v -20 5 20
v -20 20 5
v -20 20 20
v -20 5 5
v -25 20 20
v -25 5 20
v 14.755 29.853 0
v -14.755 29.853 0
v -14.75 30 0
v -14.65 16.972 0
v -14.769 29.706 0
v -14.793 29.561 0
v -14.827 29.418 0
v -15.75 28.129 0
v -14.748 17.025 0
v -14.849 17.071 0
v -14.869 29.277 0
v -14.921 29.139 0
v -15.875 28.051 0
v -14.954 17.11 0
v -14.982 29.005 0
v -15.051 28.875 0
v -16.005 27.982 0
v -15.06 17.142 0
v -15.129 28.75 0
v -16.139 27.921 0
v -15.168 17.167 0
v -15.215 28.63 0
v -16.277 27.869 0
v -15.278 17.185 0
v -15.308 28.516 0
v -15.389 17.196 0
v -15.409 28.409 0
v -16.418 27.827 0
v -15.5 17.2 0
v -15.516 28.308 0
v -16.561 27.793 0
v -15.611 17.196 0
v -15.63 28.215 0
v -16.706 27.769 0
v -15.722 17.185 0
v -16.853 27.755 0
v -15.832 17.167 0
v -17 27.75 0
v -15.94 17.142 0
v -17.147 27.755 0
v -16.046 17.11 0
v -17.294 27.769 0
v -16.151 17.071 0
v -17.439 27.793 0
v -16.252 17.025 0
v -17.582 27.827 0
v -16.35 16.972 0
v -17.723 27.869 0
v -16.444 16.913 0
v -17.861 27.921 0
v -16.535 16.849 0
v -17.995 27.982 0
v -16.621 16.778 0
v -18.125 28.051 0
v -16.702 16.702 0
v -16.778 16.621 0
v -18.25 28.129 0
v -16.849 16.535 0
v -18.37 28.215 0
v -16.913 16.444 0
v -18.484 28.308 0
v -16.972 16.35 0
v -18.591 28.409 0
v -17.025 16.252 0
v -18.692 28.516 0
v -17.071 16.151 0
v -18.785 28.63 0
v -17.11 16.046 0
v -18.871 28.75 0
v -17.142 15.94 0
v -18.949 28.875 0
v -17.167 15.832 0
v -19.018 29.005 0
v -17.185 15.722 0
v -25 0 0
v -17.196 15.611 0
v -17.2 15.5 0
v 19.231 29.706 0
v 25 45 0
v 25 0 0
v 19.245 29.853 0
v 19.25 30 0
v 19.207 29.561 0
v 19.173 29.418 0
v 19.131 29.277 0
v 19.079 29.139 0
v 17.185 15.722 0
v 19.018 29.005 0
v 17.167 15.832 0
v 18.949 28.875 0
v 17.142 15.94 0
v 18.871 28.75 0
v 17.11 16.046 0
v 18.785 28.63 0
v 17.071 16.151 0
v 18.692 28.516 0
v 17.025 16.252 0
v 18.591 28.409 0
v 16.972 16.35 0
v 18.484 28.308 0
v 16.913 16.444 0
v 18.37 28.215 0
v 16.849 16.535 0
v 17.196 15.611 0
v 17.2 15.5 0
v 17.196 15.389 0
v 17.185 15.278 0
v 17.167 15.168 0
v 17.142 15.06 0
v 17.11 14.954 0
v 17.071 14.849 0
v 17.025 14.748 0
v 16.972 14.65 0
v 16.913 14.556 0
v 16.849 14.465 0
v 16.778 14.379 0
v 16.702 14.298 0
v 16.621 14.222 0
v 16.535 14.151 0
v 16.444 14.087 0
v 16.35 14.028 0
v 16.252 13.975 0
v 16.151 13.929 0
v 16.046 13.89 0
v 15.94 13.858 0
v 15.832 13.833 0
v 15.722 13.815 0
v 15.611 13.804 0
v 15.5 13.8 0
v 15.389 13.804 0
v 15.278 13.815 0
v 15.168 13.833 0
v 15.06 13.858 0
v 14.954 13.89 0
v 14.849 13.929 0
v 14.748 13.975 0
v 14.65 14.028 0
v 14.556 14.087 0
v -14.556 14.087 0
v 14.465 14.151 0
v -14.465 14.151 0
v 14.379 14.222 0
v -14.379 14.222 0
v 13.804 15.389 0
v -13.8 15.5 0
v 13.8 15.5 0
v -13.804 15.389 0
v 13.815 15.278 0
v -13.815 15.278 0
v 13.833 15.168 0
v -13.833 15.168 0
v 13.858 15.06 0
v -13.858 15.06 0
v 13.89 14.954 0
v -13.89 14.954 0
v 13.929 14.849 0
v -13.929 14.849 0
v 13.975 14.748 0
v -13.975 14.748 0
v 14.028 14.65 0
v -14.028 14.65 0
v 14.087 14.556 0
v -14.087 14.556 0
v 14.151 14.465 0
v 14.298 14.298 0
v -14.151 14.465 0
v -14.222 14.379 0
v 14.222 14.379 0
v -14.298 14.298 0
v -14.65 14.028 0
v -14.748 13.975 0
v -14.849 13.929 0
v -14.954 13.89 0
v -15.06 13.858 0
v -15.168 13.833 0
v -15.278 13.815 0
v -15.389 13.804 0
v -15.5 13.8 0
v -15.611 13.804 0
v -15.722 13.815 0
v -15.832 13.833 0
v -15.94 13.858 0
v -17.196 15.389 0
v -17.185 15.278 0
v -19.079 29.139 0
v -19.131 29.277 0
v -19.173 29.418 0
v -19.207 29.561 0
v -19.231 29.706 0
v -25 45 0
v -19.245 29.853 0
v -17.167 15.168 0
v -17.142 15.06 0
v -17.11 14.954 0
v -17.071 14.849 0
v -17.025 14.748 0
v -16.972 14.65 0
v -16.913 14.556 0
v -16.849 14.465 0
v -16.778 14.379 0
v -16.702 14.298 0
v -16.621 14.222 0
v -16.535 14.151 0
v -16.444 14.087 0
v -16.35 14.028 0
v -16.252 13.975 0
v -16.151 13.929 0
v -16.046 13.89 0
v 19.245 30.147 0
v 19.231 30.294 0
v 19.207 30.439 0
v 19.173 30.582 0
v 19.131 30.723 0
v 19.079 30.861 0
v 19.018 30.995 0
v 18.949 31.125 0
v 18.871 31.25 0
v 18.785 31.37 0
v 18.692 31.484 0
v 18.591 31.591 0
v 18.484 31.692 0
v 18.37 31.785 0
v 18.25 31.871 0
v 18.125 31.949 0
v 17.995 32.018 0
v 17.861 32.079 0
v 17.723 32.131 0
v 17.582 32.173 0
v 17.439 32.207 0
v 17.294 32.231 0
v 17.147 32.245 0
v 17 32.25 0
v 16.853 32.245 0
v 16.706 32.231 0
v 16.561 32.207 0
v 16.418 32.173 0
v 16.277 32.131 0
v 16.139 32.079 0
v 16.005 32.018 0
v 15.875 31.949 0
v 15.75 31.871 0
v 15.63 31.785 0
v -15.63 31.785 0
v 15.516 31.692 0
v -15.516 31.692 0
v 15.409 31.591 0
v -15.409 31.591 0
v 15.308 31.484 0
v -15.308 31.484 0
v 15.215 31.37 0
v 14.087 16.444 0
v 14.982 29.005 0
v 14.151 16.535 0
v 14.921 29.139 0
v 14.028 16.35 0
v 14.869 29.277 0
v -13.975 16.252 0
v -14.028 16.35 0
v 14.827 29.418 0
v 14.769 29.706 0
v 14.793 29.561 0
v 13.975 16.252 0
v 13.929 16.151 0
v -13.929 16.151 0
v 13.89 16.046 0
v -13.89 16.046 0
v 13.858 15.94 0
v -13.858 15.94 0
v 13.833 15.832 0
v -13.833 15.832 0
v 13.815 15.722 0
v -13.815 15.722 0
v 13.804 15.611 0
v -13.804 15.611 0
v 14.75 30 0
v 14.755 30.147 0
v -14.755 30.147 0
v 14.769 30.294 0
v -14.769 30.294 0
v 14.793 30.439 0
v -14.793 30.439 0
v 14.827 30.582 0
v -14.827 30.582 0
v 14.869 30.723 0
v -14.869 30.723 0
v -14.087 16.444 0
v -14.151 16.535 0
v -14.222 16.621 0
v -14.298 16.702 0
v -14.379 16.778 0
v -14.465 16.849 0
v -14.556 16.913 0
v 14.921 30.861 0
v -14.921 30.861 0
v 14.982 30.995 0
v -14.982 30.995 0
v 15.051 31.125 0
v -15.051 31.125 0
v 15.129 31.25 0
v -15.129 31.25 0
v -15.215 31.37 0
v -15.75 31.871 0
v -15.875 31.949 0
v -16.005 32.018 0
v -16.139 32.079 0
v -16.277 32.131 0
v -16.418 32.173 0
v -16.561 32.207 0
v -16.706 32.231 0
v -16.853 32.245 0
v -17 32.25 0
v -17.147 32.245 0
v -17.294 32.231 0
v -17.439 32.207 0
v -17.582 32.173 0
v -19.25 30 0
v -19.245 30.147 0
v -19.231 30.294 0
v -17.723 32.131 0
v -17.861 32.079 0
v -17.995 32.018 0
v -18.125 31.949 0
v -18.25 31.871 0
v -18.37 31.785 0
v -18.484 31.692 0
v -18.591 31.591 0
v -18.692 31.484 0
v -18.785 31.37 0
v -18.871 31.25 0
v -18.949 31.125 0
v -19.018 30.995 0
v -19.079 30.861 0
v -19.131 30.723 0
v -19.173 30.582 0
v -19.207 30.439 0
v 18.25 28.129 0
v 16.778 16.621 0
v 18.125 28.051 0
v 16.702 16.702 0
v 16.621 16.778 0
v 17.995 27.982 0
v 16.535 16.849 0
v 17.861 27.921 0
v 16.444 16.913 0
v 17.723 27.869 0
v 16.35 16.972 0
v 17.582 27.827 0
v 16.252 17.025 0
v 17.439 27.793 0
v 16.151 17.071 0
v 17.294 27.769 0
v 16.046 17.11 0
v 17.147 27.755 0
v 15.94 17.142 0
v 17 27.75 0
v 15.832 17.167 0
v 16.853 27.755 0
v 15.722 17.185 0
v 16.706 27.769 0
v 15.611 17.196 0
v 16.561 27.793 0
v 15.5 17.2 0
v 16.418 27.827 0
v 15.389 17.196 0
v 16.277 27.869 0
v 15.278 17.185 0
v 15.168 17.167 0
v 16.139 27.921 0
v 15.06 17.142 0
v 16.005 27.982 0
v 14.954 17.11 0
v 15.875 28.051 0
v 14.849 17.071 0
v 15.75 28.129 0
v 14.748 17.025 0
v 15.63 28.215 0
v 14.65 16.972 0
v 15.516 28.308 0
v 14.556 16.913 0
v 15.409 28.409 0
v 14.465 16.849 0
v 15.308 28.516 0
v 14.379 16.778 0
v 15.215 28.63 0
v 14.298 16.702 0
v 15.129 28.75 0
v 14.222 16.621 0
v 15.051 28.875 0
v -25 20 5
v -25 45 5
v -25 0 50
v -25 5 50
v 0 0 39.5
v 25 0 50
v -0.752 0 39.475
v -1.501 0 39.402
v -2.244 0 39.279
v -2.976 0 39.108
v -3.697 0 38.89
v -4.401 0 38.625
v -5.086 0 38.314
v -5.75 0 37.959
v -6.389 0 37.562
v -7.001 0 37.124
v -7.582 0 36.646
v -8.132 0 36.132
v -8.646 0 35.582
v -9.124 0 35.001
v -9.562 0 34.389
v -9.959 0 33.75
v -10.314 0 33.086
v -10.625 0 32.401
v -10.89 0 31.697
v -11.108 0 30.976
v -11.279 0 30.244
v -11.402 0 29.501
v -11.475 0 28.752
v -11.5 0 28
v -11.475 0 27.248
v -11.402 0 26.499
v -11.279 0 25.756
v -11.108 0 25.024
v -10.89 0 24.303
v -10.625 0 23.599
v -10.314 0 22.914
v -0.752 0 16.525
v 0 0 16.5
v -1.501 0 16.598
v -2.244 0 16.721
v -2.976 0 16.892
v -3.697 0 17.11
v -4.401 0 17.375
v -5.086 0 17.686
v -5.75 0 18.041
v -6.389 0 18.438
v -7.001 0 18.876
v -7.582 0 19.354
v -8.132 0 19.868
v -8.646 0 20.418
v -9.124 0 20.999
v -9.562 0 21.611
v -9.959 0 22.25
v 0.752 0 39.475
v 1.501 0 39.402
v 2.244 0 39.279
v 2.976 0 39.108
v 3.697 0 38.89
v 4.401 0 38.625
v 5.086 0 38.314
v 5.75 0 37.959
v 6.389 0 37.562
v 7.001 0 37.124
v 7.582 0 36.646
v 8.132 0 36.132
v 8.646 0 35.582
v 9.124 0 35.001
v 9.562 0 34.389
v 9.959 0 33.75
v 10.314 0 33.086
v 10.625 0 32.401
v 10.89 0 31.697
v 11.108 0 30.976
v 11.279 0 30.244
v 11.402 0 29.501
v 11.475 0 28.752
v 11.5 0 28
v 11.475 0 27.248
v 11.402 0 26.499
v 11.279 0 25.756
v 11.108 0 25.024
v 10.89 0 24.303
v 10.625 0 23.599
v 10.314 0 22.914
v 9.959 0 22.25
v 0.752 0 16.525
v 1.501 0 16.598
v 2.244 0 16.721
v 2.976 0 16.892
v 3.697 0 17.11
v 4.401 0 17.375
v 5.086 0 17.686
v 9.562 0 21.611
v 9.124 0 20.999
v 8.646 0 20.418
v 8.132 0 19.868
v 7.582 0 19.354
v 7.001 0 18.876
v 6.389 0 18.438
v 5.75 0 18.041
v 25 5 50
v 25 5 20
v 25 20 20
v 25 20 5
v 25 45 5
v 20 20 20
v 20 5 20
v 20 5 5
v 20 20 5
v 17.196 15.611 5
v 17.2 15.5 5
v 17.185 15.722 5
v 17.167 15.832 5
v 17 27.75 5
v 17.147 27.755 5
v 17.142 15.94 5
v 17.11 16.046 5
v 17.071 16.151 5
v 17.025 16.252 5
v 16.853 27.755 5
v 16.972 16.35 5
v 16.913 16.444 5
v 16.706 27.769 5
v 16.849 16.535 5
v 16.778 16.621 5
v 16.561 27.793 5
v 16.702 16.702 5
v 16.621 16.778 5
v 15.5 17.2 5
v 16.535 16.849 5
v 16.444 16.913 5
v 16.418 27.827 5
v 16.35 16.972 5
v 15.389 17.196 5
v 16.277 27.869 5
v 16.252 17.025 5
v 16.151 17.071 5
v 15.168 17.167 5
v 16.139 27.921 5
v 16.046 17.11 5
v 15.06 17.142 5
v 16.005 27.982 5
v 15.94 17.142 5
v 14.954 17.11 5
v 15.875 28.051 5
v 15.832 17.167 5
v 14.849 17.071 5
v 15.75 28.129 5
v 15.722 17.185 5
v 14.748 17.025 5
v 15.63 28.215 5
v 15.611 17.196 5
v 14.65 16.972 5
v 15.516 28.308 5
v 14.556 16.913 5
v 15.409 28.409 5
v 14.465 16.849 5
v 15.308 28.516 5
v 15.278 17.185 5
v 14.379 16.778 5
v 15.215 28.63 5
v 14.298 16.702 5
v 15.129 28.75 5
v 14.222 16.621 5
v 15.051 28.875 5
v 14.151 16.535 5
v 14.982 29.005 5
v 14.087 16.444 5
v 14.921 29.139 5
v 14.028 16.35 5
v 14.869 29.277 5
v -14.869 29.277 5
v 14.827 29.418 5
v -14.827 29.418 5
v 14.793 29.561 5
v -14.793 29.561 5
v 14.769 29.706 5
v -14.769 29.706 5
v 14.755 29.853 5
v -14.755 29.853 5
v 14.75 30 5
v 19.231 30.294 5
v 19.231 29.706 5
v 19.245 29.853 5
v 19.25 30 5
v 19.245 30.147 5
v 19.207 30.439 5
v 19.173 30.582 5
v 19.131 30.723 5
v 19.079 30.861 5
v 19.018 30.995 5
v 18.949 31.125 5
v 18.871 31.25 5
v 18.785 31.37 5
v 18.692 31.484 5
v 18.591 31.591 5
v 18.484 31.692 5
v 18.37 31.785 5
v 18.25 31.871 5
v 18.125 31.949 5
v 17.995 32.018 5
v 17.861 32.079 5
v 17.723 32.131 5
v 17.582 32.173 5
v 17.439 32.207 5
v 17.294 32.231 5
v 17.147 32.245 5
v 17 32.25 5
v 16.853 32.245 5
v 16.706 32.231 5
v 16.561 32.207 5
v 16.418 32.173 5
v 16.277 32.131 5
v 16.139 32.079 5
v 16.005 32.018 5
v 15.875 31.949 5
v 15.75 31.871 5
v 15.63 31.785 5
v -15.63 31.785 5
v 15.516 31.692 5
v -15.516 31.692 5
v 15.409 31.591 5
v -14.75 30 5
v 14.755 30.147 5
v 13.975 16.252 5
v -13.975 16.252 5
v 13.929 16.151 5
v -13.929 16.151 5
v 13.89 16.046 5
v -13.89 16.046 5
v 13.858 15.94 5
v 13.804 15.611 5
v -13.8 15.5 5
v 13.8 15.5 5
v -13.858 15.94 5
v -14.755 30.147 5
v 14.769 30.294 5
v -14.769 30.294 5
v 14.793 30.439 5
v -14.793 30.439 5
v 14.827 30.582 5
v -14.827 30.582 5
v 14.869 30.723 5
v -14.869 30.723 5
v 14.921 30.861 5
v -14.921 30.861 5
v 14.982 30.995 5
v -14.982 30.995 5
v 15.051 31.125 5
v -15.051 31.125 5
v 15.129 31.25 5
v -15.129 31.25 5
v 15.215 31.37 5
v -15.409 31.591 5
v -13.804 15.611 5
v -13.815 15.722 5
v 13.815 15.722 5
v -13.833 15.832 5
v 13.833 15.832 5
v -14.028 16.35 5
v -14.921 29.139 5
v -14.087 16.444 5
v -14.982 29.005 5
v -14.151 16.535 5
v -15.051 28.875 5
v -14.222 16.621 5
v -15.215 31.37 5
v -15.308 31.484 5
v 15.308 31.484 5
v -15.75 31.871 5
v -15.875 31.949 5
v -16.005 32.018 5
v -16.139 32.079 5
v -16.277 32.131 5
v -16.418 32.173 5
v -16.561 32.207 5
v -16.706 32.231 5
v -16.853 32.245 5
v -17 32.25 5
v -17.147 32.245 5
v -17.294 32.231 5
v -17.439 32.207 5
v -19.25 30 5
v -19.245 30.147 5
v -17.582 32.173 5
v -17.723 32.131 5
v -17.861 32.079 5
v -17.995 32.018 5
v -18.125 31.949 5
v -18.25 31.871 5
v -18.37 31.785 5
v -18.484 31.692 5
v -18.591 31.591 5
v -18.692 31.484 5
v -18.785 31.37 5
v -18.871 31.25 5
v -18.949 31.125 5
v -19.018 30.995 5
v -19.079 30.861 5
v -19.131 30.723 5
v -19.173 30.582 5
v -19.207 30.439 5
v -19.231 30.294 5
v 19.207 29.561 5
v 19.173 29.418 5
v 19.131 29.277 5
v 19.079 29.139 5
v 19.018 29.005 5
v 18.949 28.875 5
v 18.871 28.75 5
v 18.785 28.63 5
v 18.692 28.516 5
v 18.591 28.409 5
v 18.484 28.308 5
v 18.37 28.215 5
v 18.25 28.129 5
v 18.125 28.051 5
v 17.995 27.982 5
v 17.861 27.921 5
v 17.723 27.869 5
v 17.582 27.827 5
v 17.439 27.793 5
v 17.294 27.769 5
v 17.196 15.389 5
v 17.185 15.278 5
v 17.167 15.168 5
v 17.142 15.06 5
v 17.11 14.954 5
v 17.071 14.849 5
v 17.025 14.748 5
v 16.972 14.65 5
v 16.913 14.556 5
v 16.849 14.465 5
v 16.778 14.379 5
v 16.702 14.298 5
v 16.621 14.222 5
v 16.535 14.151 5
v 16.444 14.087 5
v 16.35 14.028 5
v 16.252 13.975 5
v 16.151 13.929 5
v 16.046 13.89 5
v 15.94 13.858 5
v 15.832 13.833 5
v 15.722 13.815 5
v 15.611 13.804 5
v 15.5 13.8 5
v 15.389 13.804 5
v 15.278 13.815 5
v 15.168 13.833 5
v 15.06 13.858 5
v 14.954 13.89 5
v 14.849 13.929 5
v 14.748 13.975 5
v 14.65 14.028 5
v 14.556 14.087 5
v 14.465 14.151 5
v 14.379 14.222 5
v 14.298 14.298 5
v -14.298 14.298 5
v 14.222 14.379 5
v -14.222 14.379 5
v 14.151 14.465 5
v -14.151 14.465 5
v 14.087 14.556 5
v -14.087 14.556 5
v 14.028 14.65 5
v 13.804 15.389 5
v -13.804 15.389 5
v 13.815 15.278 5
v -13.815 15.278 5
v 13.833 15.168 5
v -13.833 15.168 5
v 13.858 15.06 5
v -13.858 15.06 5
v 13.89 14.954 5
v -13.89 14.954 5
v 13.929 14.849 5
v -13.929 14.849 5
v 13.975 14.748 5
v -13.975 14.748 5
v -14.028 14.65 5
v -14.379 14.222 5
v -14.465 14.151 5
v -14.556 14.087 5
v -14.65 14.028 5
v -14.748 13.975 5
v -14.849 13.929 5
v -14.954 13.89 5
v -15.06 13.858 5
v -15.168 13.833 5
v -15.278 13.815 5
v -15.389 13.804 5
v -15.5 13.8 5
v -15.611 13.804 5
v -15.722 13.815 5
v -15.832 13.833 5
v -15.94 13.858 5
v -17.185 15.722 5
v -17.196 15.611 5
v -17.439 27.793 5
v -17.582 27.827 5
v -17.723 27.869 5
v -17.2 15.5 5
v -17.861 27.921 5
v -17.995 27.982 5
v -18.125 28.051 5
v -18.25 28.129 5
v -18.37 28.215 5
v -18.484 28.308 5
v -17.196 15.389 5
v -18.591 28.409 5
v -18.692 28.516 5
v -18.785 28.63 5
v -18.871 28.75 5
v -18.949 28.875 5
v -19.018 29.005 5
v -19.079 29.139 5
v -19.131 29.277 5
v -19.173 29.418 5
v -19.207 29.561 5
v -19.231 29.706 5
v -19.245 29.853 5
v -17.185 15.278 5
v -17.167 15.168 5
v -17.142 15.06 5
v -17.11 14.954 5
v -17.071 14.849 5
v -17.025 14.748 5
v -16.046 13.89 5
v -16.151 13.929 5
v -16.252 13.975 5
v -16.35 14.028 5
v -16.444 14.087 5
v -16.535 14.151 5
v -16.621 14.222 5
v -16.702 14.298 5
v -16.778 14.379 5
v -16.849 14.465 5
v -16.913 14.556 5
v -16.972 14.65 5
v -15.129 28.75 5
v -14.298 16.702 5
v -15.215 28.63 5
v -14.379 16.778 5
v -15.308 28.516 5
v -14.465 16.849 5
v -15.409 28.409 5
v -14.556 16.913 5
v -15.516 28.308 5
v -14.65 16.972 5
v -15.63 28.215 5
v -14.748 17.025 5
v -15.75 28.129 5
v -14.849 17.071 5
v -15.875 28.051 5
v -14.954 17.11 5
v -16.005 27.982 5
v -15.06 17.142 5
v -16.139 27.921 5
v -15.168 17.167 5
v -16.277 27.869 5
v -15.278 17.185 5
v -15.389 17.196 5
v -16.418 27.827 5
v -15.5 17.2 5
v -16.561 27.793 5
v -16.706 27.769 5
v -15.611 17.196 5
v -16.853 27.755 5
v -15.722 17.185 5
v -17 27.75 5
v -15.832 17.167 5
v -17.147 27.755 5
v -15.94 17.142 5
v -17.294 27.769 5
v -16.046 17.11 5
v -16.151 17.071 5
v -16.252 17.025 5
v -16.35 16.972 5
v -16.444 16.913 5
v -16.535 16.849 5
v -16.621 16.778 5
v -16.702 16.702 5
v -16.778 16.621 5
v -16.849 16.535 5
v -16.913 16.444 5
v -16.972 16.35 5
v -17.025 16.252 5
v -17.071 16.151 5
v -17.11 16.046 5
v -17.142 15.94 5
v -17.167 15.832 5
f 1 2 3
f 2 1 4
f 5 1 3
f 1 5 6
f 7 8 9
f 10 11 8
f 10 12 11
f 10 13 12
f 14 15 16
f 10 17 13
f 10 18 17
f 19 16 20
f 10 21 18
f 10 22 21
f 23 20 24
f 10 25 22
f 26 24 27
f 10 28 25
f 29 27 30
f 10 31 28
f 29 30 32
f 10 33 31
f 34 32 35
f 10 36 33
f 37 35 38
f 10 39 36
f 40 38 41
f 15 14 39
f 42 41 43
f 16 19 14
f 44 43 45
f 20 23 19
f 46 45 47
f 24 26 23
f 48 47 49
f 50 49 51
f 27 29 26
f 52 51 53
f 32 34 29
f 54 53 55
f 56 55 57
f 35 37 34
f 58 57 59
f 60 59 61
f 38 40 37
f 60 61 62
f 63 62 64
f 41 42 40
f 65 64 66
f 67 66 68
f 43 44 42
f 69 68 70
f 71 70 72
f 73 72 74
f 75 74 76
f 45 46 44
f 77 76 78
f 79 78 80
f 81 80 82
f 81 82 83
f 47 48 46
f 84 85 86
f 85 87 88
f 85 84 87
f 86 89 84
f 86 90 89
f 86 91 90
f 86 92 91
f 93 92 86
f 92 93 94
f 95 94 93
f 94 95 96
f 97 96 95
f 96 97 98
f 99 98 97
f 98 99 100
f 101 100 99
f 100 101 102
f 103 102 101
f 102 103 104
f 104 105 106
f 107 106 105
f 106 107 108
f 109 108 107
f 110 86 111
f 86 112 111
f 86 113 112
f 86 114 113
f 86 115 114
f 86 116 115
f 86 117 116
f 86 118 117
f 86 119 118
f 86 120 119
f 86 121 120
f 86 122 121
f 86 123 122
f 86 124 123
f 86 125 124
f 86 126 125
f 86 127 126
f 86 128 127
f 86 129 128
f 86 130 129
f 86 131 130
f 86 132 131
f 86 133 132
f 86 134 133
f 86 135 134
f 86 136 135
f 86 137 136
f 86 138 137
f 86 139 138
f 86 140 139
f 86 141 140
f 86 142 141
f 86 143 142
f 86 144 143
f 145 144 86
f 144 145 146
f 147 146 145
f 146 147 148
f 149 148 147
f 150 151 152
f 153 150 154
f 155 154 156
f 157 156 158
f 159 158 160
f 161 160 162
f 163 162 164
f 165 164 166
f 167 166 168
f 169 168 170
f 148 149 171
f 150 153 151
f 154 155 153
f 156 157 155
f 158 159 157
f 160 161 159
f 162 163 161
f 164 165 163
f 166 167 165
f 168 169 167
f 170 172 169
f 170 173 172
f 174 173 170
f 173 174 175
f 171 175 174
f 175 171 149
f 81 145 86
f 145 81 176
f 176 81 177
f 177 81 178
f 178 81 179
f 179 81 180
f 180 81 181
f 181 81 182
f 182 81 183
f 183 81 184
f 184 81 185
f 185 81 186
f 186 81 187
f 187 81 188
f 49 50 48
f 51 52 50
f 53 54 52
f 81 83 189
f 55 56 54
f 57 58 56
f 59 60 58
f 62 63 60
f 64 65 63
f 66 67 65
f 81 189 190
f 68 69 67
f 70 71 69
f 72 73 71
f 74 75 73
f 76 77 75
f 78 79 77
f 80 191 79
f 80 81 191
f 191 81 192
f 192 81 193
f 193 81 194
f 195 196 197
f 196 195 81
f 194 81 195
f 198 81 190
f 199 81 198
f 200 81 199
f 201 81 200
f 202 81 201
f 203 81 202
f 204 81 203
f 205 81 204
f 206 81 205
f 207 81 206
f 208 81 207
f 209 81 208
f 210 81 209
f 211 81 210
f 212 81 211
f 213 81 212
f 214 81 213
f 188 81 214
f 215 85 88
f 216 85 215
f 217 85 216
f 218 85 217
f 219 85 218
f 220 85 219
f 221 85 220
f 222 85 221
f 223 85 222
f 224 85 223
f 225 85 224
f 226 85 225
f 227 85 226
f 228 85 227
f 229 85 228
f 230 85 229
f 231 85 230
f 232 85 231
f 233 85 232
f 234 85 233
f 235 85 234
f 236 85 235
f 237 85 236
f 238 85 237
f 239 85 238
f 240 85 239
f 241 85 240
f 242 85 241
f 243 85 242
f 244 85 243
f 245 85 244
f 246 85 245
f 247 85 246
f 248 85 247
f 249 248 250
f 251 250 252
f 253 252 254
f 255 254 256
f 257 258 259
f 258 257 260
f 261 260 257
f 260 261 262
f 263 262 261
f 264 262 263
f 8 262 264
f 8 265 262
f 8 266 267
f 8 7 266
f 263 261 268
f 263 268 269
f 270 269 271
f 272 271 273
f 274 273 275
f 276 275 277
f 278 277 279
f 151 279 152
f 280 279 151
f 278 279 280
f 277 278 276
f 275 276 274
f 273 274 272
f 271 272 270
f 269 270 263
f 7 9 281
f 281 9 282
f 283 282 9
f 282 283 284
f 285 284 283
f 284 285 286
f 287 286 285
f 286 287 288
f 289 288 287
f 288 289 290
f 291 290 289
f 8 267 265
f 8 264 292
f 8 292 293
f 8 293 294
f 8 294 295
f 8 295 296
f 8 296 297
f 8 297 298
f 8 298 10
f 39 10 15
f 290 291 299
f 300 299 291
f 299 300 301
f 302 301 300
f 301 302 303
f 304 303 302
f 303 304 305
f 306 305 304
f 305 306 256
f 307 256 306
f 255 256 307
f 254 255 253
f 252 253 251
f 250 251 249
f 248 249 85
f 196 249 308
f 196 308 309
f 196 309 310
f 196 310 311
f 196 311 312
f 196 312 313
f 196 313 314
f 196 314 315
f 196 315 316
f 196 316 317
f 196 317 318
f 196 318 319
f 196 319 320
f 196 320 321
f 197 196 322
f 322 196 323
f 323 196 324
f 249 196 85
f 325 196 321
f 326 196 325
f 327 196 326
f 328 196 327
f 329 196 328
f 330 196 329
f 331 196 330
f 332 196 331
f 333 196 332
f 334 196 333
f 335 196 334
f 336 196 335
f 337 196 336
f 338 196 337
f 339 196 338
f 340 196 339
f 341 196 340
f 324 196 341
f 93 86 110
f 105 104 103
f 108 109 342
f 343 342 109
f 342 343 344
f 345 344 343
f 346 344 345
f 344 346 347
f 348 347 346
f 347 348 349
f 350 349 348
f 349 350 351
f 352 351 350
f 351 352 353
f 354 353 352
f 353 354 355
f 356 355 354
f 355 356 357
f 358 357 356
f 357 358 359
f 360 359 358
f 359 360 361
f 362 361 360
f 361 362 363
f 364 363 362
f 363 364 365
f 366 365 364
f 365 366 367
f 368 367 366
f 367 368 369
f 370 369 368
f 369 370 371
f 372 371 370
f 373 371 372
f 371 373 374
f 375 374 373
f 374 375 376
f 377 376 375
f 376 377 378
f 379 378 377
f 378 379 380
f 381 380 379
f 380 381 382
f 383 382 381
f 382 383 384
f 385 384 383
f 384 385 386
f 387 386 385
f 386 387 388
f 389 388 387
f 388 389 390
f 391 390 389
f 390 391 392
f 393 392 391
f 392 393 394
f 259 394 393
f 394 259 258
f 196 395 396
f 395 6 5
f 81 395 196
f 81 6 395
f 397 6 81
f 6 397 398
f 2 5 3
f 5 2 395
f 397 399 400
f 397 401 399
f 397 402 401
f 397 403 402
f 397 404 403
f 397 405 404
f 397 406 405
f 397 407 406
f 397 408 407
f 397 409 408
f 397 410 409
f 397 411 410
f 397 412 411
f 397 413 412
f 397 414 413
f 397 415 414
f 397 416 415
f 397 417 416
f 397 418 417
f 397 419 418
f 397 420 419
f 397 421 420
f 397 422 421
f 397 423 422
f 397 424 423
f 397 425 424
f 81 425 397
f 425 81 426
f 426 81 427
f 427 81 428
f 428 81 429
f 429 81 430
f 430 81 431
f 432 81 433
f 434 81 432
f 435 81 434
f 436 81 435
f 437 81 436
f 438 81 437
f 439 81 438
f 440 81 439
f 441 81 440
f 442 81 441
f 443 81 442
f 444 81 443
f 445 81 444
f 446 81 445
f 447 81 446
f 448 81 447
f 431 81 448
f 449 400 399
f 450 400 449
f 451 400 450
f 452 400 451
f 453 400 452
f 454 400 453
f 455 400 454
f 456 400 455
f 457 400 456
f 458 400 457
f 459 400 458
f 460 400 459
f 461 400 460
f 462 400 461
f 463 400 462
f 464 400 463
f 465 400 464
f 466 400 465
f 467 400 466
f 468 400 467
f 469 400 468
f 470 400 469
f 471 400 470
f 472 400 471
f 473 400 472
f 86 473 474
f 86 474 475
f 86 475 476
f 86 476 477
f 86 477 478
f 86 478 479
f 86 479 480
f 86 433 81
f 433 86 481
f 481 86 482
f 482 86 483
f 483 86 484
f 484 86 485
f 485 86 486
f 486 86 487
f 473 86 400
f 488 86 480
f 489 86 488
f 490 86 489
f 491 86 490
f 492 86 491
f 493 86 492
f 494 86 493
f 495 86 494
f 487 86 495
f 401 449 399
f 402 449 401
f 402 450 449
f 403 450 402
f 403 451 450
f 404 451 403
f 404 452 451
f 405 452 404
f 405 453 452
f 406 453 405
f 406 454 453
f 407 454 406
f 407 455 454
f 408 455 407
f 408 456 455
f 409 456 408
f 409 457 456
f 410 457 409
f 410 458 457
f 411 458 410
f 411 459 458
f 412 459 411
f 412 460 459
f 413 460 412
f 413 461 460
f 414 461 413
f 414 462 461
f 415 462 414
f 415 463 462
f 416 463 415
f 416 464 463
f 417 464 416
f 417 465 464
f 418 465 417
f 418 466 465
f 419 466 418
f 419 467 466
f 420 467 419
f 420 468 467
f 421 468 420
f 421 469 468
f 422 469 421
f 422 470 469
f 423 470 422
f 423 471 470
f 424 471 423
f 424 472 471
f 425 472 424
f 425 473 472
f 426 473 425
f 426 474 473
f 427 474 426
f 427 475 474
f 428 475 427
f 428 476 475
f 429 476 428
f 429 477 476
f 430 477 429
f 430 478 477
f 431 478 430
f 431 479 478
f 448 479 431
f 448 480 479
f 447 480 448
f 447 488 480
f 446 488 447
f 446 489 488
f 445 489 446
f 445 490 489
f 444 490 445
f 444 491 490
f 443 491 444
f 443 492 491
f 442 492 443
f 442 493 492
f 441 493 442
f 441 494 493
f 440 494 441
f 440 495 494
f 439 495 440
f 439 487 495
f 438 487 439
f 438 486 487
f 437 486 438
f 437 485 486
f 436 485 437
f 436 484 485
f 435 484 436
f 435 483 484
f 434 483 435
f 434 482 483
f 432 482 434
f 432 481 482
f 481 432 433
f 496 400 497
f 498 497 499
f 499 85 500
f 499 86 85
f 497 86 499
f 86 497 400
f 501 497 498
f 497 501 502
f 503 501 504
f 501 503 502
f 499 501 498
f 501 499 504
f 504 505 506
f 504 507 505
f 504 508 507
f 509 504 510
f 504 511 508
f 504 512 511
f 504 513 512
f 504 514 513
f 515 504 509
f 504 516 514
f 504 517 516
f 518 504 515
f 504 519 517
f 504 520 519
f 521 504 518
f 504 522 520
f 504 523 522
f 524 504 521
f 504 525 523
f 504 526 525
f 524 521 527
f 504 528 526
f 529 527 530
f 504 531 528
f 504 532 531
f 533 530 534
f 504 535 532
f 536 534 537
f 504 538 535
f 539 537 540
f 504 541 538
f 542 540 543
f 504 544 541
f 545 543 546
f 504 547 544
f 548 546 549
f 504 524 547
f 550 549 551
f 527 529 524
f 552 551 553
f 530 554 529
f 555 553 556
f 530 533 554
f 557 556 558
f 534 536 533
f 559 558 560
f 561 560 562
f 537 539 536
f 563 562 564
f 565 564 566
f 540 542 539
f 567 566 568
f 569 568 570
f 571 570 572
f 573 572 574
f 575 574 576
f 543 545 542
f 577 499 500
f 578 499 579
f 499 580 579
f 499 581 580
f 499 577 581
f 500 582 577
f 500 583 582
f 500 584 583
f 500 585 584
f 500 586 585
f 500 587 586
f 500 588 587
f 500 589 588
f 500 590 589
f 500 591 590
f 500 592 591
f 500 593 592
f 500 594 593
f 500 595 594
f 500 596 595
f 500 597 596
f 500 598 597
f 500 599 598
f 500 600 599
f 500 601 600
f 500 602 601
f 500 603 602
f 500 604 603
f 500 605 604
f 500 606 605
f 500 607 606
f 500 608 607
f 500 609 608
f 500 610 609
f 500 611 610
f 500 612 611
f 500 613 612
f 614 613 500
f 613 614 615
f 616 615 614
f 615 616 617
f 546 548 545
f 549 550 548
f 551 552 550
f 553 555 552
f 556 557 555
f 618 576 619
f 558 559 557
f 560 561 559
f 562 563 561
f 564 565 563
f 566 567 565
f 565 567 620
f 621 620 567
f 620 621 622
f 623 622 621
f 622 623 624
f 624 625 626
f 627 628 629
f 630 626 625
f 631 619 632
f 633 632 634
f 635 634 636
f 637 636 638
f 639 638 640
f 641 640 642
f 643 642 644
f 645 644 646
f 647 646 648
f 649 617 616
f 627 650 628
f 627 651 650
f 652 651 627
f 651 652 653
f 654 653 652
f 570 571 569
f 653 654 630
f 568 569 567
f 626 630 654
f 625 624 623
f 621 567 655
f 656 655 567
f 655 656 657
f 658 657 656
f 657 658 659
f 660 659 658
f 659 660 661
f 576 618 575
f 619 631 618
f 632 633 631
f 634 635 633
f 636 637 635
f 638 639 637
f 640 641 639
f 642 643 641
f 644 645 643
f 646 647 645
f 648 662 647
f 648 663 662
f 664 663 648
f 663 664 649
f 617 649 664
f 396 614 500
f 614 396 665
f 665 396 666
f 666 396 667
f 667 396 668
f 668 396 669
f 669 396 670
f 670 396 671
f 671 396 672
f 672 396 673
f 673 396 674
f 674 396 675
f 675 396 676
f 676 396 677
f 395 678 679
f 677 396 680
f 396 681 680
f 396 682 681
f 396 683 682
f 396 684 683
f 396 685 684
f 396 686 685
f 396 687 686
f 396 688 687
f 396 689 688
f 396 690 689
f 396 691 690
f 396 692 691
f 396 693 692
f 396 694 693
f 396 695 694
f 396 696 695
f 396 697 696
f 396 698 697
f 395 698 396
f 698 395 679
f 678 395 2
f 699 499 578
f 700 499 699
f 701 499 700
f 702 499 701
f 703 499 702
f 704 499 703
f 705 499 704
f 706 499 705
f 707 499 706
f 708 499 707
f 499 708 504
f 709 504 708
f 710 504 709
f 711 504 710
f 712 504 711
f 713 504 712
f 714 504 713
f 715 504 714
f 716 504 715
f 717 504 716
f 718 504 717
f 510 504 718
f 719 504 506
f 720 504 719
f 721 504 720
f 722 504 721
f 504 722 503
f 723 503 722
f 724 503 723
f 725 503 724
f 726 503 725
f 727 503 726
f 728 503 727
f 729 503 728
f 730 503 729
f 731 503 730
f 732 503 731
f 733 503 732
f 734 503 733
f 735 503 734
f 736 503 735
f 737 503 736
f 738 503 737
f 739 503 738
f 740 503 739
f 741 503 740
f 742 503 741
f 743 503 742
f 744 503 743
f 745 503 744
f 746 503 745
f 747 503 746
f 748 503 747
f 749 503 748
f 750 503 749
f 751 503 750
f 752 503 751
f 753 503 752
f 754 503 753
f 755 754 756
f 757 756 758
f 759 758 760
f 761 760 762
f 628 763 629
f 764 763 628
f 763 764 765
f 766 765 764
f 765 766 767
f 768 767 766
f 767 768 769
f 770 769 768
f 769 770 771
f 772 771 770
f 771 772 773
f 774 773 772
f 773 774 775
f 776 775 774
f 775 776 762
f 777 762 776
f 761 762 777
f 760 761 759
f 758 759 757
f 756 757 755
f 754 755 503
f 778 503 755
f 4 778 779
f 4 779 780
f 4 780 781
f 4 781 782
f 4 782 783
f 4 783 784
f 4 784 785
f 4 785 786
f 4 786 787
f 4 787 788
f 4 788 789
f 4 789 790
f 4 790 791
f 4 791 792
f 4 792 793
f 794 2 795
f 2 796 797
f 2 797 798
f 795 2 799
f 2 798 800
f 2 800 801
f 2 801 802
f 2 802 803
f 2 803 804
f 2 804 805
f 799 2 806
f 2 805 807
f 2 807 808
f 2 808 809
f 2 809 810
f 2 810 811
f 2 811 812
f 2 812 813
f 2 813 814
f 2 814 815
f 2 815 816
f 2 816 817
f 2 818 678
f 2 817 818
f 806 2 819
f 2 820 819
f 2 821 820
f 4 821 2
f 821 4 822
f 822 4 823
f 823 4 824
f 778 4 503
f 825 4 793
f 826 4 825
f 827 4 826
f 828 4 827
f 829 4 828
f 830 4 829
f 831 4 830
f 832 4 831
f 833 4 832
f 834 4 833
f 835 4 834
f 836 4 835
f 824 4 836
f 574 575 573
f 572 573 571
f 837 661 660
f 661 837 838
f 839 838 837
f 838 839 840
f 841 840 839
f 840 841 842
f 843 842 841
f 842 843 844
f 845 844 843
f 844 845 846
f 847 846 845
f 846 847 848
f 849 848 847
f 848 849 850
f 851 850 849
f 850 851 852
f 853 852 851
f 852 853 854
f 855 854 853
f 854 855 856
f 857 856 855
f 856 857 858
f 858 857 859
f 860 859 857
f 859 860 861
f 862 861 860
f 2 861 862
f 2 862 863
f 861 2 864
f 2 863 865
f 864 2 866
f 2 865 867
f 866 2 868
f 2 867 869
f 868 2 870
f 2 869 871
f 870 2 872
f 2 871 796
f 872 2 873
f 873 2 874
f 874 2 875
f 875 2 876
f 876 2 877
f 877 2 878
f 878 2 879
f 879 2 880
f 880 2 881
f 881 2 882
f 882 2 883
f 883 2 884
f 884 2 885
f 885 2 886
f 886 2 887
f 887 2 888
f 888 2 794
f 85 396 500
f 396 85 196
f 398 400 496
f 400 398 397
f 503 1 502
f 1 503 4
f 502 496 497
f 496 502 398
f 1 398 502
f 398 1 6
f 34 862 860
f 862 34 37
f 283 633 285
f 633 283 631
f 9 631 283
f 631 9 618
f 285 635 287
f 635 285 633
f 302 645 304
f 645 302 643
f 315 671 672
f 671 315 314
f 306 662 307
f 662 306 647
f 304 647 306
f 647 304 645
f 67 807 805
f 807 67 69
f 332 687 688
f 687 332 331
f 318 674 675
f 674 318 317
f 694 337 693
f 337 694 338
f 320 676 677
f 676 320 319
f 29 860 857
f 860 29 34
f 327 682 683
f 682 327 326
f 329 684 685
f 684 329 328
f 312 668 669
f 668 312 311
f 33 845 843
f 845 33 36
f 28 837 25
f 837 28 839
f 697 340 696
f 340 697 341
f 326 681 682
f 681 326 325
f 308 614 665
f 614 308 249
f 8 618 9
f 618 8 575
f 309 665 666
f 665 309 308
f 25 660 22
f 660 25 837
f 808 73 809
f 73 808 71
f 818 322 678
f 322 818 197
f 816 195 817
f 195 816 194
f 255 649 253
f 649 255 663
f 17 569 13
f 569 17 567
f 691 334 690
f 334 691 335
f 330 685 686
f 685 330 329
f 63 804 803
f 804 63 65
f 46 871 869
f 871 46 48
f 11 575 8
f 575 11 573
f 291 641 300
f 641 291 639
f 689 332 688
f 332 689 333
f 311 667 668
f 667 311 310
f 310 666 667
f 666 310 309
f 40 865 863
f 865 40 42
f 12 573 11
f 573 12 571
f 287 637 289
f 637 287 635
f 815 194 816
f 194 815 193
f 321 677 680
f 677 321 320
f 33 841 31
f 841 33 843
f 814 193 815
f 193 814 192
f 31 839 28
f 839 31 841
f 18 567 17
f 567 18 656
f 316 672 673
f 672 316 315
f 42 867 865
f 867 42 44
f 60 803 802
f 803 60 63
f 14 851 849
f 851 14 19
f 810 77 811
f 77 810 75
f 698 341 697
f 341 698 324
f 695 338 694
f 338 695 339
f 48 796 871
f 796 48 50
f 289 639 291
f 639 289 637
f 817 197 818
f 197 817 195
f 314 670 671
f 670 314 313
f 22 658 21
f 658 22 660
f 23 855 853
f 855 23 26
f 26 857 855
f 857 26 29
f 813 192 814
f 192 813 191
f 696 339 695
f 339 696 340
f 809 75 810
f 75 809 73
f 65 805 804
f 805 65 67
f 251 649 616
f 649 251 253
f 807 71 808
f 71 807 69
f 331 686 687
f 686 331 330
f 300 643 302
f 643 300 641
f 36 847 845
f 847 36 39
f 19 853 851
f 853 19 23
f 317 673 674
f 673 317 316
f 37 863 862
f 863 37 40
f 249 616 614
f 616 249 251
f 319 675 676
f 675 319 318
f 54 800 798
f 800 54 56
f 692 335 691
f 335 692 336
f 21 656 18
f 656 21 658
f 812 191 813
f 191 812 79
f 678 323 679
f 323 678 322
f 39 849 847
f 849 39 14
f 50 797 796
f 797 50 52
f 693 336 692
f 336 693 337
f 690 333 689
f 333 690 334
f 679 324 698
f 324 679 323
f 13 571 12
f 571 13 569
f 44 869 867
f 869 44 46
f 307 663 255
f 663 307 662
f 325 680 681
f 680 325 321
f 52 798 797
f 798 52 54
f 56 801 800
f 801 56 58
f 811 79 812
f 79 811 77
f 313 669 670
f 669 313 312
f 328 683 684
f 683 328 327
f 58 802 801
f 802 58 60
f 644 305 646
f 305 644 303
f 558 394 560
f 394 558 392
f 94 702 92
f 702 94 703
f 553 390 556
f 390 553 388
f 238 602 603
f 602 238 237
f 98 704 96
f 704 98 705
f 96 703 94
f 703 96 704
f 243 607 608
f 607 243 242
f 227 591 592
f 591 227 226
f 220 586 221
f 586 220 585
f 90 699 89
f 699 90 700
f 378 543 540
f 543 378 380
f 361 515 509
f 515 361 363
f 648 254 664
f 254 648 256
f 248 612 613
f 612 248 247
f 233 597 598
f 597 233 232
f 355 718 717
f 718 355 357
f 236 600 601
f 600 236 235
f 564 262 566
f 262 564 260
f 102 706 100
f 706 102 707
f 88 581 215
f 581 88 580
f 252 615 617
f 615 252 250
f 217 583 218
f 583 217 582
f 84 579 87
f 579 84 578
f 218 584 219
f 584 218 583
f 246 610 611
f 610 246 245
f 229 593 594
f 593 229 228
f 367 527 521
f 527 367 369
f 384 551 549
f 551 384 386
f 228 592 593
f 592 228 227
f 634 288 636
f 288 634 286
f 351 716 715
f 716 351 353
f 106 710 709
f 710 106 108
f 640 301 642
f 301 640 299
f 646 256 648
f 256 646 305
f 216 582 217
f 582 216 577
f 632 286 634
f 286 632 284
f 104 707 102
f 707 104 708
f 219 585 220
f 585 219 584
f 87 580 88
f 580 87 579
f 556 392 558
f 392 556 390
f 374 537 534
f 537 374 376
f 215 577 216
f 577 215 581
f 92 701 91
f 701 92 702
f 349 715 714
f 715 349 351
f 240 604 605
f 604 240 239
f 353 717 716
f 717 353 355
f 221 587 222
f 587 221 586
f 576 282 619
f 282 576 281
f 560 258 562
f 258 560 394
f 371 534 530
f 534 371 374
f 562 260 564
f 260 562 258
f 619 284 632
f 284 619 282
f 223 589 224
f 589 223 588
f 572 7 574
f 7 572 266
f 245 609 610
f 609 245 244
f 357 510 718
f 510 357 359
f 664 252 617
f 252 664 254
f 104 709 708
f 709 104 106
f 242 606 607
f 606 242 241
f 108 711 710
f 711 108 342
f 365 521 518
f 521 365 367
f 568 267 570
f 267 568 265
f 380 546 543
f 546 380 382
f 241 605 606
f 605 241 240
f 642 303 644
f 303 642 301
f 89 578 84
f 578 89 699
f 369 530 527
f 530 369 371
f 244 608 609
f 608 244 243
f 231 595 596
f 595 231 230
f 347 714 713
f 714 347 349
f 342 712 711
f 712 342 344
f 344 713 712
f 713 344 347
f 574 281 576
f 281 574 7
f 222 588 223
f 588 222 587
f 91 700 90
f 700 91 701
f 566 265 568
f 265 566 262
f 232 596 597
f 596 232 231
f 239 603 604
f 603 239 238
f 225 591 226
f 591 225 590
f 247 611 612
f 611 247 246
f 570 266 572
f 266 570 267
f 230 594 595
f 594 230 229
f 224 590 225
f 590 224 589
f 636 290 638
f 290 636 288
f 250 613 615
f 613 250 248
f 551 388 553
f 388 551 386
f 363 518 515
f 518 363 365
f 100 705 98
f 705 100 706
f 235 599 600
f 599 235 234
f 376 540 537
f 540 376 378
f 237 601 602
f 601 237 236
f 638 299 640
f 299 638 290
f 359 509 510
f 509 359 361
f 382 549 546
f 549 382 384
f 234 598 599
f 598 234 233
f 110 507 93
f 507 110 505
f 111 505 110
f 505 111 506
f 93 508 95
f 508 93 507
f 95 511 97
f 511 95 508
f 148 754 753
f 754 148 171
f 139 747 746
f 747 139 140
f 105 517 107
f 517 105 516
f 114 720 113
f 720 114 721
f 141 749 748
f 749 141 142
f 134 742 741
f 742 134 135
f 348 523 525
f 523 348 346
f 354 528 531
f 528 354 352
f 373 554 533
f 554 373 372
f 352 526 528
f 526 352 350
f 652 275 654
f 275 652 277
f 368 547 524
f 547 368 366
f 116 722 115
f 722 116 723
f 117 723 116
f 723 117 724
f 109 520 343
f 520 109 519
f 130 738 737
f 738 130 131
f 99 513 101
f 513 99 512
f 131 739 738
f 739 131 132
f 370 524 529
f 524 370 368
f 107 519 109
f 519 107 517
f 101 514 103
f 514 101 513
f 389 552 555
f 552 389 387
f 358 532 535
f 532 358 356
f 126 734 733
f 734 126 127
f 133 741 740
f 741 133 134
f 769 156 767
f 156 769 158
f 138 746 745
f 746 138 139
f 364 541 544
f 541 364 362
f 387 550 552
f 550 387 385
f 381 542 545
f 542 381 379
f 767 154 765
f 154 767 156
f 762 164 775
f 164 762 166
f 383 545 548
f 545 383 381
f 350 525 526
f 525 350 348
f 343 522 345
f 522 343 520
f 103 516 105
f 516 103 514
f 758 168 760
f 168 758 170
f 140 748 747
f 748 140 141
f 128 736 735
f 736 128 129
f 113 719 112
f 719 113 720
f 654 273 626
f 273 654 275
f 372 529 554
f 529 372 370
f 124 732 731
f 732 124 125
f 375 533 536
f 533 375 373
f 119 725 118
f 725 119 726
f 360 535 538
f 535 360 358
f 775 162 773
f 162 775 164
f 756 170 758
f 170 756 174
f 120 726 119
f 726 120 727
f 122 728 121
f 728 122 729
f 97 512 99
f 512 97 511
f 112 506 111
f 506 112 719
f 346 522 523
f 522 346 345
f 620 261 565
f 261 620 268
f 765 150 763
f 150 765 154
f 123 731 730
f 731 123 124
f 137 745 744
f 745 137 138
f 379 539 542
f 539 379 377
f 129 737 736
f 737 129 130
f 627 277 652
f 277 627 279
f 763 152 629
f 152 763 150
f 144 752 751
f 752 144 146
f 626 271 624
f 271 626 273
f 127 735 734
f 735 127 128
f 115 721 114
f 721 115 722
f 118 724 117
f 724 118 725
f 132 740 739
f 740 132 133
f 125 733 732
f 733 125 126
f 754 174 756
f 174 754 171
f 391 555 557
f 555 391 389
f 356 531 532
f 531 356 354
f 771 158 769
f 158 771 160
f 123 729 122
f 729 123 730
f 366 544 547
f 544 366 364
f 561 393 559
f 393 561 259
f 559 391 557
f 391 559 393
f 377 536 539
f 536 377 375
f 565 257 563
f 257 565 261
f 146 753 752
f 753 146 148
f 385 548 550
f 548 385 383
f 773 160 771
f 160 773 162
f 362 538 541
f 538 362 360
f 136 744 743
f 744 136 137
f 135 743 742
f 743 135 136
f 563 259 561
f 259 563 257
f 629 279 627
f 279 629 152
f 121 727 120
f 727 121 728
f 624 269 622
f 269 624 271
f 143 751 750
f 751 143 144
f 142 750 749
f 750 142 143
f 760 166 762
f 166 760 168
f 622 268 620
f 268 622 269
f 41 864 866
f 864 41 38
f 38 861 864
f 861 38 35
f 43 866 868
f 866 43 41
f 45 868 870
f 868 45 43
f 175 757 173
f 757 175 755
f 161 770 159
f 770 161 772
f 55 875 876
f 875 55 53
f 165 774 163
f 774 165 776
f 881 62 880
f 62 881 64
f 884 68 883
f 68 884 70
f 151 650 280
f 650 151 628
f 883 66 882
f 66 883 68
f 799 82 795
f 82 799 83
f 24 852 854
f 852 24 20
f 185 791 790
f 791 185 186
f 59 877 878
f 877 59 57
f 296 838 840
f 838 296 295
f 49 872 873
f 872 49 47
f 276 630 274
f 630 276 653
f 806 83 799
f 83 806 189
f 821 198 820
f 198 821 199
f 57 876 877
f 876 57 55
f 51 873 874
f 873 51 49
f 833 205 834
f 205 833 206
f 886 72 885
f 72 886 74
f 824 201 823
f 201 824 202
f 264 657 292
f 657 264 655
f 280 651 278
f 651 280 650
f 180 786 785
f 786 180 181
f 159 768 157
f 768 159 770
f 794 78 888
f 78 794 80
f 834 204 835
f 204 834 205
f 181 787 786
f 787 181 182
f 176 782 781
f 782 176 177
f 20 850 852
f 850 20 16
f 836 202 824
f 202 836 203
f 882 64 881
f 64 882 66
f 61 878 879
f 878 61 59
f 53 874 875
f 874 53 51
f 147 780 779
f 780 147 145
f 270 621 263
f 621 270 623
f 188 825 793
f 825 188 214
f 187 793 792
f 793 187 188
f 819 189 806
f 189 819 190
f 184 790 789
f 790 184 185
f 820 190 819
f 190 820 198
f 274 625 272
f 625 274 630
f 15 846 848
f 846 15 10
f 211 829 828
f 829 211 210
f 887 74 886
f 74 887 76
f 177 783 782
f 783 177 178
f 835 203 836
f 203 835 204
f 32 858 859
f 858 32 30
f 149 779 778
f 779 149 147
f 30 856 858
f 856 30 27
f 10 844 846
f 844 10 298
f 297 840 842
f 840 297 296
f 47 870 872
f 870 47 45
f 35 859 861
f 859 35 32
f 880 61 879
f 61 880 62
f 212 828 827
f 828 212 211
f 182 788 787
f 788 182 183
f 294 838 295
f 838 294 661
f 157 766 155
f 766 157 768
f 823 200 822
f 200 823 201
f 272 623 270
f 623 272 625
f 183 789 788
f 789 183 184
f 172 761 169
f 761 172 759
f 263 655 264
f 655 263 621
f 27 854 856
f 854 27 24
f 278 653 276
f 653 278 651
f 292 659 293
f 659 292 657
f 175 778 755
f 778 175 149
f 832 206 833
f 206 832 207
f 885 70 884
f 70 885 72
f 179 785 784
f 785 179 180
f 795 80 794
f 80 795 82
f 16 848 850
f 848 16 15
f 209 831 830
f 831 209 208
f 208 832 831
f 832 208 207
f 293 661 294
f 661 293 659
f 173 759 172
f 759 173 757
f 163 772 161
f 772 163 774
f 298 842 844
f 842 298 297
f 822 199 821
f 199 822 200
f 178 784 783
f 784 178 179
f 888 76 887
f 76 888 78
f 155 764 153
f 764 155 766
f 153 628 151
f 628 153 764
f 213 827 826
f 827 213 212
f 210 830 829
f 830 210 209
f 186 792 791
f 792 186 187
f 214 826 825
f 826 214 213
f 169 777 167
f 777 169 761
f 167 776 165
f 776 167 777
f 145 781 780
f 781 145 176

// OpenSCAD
// L-shaped mounting bracket for a NEMA 17 stepper motor (e.g. syringe pump)
// Print orientation: base plate on the bed, vertical motor plate building up in +Z

// ---------------- Parameters ----------------
base_x      = 25;    // base plate half-length in X (mm)
base_y      = 45;    // base plate length in Y (mm)
base_t      = 5;     // base plate thickness in Z (mm)

hole_m4_x   = 17;    // M4 through-hole offset from centre in X (mm)
hole_m4_y   = 30;    // M4 through-hole Y position (mm)

motor_h     = 50;    // vertical motor plate height (mm)
motor_w     = 5;     // vertical motor plate width in Y (mm)

boss_d      = 23;    // motor centring boss hole diameter (mm)
boss_x      = 0;     // boss hole X position (mm)
boss_z      = 28;    // boss hole Z position (mm)

screw_d     = 3.4;   // M3 screw hole diameter (mm)
screw_p     = 31;    // square pitch of the four screw holes (mm)

gusset_t    = 5;     // gusset thickness (mm)
gusset_leg  = 20;    // right-triangle leg length along +Y and +Z (mm)

eps         = 0.5;   // cutter overshoot past faces (mm)
$fn         = 96;    // curve resolution

// ---------------- Model ----------------
difference() {
    union() {
        // Base plate
        translate([-base_x, 0, 0])
            cube([2 * base_x, base_y, base_t]);

        // Vertical motor plate, standing on the back edge of the base
        translate([-base_x, 0, 0])
            cube([2 * base_x, motor_w, motor_h]);

        // Gussets, flush with the left and right edges
        for (sx = [-1, 1])
            translate([sx > 0 ? base_x - gusset_t : -base_x, 0, 0])
                cube([gusset_t, gusset_leg, gusset_leg]);
    }

    // Base plate M4 through-holes
    for (sx = [-1, 1])
        translate([sx * hole_m4_x, hole_m4_y, -eps])
            cylinder(d = 4.5, h = base_t + motor_w + 2 * eps);

    // Motor centring boss hole, along Y
    translate([boss_x, 0, boss_z])
        rotate([90, 0, 0])
            cylinder(d = boss_d, h = motor_w + 2 * eps);

    // Four M3 screw holes on a square pattern, centred on the boss hole
    for (a = [0, 90, 180, 270])
        rotate([0, 0, a])
            translate([screw_p / 2, screw_p / 2, 0])
                cylinder(d = screw_d, h = motor_h + eps);
}
